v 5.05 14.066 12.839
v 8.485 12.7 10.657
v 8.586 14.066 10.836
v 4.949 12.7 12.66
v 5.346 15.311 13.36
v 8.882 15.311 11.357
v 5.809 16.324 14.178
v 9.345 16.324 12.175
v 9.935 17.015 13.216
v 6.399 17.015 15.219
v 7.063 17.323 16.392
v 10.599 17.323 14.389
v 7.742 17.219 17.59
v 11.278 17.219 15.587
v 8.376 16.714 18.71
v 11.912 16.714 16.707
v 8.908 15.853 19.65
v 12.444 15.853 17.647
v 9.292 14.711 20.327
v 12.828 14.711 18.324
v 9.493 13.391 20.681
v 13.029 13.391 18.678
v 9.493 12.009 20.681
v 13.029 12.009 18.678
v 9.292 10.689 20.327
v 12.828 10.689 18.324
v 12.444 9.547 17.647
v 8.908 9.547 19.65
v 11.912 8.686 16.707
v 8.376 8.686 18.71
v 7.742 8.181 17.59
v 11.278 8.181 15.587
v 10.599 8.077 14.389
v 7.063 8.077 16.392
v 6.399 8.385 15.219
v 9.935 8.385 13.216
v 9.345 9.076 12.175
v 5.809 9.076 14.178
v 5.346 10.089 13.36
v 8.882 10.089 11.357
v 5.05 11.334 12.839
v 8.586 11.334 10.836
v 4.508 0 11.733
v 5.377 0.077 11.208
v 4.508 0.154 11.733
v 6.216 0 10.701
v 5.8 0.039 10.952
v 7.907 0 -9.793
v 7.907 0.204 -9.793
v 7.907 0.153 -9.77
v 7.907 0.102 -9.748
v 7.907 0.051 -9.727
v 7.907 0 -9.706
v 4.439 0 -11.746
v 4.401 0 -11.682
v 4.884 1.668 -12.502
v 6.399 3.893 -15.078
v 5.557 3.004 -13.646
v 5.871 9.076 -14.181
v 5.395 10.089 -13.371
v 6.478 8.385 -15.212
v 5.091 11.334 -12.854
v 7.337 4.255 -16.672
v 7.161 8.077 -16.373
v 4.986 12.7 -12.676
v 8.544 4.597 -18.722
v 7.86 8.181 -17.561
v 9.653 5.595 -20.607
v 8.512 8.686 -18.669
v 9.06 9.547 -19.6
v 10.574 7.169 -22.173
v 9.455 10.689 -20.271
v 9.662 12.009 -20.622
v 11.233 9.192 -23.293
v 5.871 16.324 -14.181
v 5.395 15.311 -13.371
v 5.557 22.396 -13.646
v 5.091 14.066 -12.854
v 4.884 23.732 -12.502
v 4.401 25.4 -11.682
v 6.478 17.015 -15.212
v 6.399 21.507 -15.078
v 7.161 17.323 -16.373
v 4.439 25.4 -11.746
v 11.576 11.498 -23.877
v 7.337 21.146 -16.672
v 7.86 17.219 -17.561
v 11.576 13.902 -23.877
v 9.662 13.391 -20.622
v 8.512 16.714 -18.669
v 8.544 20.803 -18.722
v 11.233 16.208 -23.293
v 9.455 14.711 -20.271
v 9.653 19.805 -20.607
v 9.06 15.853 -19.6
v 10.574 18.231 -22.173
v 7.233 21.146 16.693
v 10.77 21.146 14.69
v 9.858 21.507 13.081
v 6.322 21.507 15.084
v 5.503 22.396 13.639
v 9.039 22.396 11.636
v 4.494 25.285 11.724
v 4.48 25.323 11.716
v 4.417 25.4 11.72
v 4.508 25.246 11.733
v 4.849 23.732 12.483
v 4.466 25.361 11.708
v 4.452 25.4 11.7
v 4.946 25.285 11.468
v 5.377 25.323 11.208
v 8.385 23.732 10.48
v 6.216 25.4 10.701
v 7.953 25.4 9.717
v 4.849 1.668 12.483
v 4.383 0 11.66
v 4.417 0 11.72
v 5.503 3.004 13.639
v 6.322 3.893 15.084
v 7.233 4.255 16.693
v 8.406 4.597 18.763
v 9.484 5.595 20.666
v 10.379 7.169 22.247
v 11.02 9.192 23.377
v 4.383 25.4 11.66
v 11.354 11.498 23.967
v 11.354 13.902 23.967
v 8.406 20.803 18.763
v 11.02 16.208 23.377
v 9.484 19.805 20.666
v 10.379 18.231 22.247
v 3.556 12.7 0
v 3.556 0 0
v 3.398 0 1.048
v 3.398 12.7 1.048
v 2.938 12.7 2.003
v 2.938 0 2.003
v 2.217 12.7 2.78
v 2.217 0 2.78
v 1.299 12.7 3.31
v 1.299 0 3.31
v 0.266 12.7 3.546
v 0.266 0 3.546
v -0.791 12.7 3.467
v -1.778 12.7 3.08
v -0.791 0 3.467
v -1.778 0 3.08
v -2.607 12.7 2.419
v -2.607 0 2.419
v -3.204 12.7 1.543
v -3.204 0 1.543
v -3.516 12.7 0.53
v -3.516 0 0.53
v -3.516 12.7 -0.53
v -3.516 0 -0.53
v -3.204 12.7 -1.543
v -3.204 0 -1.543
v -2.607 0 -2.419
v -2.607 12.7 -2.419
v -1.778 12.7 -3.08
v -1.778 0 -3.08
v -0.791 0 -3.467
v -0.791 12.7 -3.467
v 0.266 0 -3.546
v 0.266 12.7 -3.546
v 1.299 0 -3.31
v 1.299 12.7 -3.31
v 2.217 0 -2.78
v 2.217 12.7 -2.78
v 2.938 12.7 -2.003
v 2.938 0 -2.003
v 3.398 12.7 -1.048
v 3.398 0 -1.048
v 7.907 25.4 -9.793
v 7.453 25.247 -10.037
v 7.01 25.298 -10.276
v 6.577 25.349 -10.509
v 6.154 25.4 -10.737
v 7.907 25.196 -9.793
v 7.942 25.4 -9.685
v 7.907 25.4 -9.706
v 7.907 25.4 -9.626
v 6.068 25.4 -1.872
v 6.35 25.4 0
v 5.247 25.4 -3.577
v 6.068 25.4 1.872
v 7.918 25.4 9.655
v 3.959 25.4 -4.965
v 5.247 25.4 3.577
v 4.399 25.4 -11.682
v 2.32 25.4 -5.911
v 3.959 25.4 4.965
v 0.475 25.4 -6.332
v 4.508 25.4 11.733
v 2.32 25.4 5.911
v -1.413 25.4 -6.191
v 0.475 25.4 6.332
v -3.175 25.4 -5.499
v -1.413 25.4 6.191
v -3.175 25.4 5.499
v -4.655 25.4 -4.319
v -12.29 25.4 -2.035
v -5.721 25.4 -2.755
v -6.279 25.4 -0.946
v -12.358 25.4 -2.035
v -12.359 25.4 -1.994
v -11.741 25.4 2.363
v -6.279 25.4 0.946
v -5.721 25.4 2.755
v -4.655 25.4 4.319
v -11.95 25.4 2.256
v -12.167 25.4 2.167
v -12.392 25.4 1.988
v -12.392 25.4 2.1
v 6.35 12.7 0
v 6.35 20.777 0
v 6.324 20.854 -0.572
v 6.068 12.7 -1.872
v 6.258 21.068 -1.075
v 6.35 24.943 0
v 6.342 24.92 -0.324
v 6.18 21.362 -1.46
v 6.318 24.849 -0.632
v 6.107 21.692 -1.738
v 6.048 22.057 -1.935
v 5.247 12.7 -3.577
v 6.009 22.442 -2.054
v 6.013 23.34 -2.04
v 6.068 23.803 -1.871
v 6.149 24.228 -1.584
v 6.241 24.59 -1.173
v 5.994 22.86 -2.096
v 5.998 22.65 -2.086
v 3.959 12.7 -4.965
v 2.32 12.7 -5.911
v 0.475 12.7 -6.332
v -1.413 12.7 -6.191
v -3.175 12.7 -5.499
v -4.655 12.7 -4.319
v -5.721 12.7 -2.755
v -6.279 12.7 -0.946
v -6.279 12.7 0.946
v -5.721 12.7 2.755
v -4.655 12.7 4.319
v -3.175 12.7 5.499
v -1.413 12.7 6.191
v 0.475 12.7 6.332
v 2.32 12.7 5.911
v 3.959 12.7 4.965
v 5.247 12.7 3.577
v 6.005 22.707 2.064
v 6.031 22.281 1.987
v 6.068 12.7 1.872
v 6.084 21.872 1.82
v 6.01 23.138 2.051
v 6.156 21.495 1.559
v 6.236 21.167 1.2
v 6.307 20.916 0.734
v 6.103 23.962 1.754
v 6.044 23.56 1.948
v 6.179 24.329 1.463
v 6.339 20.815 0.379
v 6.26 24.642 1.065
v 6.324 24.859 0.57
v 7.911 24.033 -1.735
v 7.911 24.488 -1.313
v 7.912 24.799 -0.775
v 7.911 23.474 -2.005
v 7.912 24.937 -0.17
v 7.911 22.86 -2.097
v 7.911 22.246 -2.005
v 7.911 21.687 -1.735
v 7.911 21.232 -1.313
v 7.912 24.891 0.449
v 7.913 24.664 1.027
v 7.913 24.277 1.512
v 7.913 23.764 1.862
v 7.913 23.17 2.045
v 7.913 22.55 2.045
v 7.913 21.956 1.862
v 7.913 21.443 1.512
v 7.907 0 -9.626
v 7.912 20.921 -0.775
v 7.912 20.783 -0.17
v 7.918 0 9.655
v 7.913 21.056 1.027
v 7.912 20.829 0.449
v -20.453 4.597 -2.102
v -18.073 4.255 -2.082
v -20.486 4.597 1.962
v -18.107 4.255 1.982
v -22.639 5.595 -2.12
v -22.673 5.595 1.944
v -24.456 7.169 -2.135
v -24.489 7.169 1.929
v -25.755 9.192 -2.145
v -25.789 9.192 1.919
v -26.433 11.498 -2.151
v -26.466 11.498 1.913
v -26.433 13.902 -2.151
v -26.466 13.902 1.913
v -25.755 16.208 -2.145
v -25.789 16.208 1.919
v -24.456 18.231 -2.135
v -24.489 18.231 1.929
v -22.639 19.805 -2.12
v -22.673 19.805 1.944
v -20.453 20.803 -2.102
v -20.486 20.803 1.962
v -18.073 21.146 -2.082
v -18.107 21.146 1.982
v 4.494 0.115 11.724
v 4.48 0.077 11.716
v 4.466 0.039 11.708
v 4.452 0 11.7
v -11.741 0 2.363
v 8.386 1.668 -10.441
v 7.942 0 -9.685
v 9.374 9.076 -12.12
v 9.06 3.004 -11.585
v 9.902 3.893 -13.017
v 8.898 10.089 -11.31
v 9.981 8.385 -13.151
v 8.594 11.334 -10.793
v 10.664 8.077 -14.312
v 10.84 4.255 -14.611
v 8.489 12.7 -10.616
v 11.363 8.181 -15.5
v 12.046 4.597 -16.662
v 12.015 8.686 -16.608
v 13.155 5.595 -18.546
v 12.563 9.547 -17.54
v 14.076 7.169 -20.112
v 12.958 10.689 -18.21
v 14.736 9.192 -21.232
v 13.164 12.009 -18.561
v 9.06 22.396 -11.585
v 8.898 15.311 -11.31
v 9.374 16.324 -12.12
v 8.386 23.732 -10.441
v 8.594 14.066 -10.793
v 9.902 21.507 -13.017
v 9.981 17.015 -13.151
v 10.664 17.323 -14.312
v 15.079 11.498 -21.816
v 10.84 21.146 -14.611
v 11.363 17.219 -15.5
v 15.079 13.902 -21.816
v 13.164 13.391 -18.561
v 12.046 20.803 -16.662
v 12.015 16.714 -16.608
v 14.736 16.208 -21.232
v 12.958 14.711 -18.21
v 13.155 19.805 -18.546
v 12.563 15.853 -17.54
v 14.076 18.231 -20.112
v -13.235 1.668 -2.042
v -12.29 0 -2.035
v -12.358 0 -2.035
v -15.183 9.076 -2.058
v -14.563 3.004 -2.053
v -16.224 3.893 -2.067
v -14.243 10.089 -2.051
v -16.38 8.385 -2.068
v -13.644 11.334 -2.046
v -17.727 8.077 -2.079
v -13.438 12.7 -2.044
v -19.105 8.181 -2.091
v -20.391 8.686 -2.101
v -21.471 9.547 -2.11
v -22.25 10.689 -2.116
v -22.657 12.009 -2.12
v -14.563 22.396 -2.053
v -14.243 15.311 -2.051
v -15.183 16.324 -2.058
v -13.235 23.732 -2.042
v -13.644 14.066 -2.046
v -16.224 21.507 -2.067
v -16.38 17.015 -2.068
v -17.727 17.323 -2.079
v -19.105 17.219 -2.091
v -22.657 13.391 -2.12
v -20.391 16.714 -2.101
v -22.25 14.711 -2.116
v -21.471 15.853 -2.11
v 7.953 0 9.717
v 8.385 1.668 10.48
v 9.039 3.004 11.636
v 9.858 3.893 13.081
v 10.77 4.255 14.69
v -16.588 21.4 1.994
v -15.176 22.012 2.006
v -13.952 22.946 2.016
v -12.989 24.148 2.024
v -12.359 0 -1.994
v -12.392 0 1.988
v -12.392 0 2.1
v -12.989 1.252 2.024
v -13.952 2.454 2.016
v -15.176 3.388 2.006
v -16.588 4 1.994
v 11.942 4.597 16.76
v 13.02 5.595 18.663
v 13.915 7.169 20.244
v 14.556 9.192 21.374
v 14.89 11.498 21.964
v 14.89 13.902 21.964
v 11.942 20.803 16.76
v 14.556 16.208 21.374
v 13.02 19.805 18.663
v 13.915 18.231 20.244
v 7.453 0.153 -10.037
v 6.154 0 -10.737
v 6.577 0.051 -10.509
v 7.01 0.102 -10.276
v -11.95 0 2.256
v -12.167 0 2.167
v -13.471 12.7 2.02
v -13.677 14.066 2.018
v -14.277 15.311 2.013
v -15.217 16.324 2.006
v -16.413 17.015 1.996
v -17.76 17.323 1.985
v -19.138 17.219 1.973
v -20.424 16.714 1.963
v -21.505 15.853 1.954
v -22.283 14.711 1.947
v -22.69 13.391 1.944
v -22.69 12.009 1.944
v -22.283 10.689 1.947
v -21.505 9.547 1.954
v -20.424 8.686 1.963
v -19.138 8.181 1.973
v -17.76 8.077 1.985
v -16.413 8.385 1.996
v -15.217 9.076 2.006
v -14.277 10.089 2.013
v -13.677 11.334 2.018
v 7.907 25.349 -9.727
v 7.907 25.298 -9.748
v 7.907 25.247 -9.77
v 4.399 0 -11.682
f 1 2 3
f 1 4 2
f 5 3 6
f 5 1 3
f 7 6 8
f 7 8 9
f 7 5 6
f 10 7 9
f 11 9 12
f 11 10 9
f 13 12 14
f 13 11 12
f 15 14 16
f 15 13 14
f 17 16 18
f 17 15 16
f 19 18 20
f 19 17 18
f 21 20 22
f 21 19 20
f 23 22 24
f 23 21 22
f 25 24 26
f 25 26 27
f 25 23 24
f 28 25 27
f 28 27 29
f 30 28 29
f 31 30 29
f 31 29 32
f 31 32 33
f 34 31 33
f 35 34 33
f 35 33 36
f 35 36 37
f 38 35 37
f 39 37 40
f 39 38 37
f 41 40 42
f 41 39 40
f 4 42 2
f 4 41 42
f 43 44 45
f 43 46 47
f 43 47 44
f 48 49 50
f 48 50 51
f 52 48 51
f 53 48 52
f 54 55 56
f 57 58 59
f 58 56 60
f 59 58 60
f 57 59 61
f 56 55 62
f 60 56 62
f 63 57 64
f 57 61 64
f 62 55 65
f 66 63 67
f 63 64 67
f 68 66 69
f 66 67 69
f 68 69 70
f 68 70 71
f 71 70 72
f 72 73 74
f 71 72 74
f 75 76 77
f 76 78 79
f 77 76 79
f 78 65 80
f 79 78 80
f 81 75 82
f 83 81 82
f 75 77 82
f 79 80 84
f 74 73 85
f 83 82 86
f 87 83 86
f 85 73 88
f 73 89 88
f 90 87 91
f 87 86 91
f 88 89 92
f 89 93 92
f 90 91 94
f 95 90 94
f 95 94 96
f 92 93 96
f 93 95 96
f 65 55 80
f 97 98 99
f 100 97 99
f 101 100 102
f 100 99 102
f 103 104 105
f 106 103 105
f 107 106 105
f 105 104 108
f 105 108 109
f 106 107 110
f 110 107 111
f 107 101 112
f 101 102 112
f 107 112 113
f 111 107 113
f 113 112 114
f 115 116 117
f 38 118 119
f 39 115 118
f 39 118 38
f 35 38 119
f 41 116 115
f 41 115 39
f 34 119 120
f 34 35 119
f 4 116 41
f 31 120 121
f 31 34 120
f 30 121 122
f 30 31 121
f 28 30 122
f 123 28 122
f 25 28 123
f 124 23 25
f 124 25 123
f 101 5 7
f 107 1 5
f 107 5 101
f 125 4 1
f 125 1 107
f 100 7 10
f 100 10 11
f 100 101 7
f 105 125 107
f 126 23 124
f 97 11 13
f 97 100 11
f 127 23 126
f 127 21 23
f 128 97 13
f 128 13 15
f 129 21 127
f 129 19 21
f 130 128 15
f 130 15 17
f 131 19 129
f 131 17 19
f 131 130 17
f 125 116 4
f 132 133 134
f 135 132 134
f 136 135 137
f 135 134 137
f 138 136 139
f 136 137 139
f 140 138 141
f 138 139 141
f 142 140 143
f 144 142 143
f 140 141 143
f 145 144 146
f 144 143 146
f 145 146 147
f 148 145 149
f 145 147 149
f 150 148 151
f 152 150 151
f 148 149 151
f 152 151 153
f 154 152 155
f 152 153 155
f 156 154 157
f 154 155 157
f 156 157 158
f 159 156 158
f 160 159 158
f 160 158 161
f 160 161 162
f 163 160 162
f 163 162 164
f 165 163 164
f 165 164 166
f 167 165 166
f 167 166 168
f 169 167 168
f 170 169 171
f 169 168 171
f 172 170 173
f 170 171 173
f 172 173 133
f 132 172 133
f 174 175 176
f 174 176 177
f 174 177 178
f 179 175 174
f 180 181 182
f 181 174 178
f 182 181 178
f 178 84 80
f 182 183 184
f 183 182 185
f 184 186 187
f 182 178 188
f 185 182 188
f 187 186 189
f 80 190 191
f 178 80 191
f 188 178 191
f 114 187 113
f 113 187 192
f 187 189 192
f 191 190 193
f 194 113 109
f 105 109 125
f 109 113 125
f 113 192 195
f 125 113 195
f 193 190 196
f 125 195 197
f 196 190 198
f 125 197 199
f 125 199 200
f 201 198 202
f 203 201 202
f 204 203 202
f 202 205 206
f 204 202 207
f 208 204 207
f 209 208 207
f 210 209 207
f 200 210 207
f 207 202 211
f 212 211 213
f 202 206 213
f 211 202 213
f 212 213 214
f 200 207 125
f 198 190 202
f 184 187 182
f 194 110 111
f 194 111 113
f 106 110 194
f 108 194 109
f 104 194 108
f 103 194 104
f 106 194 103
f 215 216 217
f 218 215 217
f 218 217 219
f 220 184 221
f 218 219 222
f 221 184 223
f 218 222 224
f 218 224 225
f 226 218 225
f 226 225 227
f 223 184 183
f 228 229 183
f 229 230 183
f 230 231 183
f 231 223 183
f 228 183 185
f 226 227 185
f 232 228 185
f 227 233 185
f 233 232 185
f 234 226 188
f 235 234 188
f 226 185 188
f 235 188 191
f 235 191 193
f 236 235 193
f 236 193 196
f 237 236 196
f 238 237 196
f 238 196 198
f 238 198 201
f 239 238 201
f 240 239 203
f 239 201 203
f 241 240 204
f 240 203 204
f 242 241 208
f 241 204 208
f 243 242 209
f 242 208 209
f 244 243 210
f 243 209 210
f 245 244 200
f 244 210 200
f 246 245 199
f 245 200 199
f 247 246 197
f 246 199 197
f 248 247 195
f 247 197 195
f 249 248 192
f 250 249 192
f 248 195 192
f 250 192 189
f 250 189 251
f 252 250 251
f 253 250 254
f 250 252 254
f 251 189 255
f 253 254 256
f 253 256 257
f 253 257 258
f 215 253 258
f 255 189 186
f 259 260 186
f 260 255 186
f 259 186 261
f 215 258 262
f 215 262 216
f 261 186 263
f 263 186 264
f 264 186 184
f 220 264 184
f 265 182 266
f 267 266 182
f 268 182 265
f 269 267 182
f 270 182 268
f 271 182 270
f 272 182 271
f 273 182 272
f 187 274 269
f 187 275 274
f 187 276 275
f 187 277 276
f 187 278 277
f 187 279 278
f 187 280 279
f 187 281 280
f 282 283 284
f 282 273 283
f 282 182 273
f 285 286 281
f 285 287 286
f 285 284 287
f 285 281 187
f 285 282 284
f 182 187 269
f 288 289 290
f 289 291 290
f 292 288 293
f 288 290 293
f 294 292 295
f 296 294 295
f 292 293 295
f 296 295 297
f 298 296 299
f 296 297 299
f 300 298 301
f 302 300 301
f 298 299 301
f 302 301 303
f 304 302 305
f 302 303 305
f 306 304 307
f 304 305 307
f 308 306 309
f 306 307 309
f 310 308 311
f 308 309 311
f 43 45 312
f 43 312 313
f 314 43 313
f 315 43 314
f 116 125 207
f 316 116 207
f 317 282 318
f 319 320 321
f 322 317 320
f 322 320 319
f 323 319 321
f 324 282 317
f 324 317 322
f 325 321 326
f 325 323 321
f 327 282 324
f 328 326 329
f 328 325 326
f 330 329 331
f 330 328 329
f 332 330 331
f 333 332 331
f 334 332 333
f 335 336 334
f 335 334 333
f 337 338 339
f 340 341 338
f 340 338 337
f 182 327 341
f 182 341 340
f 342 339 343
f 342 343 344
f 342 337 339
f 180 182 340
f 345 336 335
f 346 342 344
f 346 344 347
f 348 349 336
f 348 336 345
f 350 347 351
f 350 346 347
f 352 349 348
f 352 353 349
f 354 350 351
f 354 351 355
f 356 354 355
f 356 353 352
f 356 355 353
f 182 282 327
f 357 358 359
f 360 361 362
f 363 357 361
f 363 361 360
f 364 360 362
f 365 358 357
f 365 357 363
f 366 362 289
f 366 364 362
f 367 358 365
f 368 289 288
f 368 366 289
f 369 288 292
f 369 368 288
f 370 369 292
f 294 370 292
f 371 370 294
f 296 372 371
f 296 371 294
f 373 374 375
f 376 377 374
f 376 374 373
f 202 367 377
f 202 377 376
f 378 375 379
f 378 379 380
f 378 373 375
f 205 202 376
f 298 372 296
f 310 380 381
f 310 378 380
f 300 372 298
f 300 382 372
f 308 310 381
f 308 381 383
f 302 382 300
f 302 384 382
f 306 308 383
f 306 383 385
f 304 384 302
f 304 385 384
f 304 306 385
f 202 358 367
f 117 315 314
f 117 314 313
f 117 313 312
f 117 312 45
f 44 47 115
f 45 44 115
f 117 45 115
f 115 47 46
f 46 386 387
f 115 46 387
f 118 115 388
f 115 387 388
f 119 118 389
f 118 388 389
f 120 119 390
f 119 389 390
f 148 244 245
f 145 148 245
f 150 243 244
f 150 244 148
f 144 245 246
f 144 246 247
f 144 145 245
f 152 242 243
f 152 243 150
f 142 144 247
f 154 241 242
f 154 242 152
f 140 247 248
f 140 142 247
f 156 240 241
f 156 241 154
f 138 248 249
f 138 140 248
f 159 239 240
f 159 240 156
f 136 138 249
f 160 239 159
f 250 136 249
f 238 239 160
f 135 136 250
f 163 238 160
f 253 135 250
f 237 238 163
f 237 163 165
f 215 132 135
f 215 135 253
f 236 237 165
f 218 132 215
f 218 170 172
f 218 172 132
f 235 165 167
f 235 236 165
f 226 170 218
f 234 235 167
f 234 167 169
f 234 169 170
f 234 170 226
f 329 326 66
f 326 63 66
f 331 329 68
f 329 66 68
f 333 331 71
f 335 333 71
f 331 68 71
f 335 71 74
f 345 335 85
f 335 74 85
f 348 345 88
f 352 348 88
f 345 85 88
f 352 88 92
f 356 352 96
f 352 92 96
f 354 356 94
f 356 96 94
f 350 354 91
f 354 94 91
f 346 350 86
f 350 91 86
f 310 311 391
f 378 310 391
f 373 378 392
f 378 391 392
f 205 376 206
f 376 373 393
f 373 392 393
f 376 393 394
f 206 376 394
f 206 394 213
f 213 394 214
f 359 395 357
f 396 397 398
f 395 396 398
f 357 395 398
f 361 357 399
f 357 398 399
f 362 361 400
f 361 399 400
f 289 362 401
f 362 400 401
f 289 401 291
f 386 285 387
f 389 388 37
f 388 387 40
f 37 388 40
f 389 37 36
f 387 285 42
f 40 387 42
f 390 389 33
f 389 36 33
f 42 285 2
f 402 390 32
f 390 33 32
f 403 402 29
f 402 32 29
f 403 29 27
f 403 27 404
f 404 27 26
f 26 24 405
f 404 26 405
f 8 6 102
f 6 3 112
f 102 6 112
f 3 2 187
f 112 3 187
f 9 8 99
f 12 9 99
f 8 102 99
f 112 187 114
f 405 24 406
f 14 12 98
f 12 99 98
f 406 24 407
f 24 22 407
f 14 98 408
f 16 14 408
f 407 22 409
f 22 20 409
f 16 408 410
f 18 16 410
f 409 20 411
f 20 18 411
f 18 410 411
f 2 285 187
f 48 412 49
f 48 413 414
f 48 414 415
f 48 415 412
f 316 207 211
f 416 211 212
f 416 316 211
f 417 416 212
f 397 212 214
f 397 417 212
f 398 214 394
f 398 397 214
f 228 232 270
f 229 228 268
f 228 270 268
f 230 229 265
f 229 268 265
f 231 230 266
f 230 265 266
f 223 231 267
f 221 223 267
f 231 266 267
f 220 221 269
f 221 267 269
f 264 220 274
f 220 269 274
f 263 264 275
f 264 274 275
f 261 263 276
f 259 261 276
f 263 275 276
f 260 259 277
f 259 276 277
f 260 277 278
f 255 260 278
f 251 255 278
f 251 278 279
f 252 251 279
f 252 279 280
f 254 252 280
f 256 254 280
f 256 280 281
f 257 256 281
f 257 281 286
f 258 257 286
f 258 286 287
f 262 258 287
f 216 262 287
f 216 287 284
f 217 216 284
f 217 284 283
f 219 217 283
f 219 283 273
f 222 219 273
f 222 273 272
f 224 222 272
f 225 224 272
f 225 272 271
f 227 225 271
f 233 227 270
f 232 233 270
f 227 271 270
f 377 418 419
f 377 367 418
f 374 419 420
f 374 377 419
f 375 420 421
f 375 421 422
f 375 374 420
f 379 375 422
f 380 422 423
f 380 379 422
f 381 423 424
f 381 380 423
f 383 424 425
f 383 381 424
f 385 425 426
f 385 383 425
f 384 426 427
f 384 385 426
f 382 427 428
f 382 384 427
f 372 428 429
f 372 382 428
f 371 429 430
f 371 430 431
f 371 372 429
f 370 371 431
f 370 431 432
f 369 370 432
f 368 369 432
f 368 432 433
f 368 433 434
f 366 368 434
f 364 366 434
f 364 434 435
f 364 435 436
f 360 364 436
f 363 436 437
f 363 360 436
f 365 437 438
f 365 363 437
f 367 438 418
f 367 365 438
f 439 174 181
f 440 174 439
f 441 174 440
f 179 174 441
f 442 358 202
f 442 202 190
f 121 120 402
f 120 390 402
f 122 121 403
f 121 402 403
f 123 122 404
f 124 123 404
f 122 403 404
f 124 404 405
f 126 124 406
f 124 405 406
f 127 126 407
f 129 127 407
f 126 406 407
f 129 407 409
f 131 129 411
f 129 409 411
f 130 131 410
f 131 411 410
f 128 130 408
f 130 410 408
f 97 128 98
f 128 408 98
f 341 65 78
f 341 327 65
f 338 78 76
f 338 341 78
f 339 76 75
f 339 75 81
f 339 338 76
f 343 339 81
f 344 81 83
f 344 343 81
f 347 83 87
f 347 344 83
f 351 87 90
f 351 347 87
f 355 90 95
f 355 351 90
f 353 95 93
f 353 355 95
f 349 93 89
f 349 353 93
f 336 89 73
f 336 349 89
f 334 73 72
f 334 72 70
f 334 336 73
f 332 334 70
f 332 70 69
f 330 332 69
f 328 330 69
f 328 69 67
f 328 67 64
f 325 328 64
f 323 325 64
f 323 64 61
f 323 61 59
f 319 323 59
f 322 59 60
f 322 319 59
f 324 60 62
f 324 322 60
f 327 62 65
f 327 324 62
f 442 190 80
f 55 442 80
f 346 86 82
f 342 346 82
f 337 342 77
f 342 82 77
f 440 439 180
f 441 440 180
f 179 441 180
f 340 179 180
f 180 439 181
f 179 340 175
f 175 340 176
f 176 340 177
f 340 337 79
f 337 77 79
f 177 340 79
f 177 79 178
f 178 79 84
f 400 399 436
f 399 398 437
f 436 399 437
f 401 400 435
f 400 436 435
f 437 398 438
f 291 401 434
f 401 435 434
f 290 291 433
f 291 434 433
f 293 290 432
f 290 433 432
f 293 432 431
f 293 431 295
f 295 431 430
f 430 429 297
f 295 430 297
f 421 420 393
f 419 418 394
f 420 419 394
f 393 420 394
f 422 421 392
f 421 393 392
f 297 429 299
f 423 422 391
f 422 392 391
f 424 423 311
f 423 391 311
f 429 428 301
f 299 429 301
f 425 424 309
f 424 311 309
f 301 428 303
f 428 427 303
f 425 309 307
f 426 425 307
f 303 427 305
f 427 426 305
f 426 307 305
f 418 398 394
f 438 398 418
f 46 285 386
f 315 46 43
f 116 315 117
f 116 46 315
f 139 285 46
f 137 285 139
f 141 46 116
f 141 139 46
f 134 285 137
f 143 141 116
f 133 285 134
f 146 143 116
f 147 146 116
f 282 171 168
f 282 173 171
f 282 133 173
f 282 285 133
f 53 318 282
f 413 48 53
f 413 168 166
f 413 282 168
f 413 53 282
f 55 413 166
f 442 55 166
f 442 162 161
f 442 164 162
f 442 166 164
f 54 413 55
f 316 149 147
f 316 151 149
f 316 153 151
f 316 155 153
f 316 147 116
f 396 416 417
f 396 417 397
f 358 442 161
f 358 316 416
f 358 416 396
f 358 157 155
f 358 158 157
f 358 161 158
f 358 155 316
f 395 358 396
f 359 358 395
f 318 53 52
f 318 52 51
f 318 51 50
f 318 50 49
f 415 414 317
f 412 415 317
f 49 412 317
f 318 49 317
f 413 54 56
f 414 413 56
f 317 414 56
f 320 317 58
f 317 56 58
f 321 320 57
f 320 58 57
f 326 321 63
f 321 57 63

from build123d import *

# Parameters (mm, degrees)
BOSS_EXTRUDE1_DEPTH = 25.4
SKETCH3_R           = 6.35
CUT_EXTRUDE1_DEPTH  = 12.7
SKETCH4_R           = 3.556
CUT_EXTRUDE2_DEPTH  = 12.7
SKETCH11_R          = 4.6355
BOSS_EXTRUDE3_DEPTH = 2.032
CIRPATTERN1_COUNT   = 3
SKETCH12_R          = 2.0828
CUT_EXTRUDE4_DEPTH  = 2.9718
FILLET3_R           = 2.54


with BuildPart() as part:
    # Sketch1 → Boss-Extrude1 (new body)
    with BuildSketch(Plane(origin=(0, 0, 0), x_dir=(1, 0, 0), z_dir=(0, 1, 0))):
        Polygon((7.906621038, 9.792659833), (7.917579369, -9.673383406), (4.508232527, -11.732623201), (-12.391554014, -1.98820766), (-12.35878698, 1.994487054), (4.399412926, 11.682420986), align=None)
    extrude(amount=BOSS_EXTRUDE1_DEPTH)

    # Sketch3 → Cut-Extrude1 (cut)
    with BuildSketch(Plane(origin=(0, 25.4, 0), x_dir=(1, 0, 0), z_dir=(0, 1, 0))):
        Circle(SKETCH3_R)
    extrude(amount=-CUT_EXTRUDE1_DEPTH, mode=Mode.SUBTRACT)

    # Sketch4 → Cut-Extrude2 (cut)
    with BuildSketch(Plane.XZ):
        Circle(SKETCH4_R)
    extrude(amount=-CUT_EXTRUDE2_DEPTH, mode=Mode.SUBTRACT)

    # Sketch11 → Boss-Extrude3 (add, symmetric)
    with BuildSketch(Plane(origin=(-0.000811781, 0, 0.098668517), x_dir=(0.9999661570516756, 0, 0.008227074285784747), z_dir=(-0.008227074285784747, 0, 0.9999661570516756))):
        with BuildLine():
            Line((-12.151651157, 25.4), (-12.151651157, 0))
            Line((-12.151651157, 0), (-12.374777516, 0))
            ThreePointArc((-12.374777516, 0), (-14.579369049, 3.004291223), (-18.089777516, 4.2545))
            ThreePointArc((-18.089777516, 4.2545), (-26.535277516, 12.7), (-18.089777516, 21.1455))
            ThreePointArc((-18.089777516, 21.1455), (-14.579369049, 22.395708777), (-12.374777516, 25.4))
            Line((-12.374777516, 25.4), (-12.151651157, 25.4))
        make_face()
        with Locations((-18.089777516, 12.7)):
            Circle(SKETCH11_R, mode=Mode.SUBTRACT)
    boss_extrude3 = extrude(amount=BOSS_EXTRUDE3_DEPTH, both=True)

    # CirPattern1: Boss-Extrude3 ×3 about axis
    cirpattern1_axis = Axis((0, 12.7, 0), (0, 1, 0))
    for i in range(1, CIRPATTERN1_COUNT):
        add(boss_extrude3.rotate(cirpattern1_axis, i * 360 / CIRPATTERN1_COUNT))

    # Sketch12 → Cut-Extrude4 (cut)
    with BuildSketch(Plane(origin=(7.912131269, 0, -0.004454103), x_dir=(-0.0005629459184425108, 0, -0.9999998415459339), z_dir=(0.9999998415459339, 0, -0.0005629459184425108))):
        with Locations((0.010106248, 22.86)):
            Circle(SKETCH12_R)
    extrude(amount=-CUT_EXTRUDE4_DEPTH, mode=Mode.SUBTRACT)

    # Fillet3
    fillet3_edges = [part.edges().sort_by_distance(p)[0] for p in [
        (-12.320145535, 12.7, 2.029381784),
    ]]
    fillet(fillet3_edges, radius=FILLET3_R)


solid = part.part
